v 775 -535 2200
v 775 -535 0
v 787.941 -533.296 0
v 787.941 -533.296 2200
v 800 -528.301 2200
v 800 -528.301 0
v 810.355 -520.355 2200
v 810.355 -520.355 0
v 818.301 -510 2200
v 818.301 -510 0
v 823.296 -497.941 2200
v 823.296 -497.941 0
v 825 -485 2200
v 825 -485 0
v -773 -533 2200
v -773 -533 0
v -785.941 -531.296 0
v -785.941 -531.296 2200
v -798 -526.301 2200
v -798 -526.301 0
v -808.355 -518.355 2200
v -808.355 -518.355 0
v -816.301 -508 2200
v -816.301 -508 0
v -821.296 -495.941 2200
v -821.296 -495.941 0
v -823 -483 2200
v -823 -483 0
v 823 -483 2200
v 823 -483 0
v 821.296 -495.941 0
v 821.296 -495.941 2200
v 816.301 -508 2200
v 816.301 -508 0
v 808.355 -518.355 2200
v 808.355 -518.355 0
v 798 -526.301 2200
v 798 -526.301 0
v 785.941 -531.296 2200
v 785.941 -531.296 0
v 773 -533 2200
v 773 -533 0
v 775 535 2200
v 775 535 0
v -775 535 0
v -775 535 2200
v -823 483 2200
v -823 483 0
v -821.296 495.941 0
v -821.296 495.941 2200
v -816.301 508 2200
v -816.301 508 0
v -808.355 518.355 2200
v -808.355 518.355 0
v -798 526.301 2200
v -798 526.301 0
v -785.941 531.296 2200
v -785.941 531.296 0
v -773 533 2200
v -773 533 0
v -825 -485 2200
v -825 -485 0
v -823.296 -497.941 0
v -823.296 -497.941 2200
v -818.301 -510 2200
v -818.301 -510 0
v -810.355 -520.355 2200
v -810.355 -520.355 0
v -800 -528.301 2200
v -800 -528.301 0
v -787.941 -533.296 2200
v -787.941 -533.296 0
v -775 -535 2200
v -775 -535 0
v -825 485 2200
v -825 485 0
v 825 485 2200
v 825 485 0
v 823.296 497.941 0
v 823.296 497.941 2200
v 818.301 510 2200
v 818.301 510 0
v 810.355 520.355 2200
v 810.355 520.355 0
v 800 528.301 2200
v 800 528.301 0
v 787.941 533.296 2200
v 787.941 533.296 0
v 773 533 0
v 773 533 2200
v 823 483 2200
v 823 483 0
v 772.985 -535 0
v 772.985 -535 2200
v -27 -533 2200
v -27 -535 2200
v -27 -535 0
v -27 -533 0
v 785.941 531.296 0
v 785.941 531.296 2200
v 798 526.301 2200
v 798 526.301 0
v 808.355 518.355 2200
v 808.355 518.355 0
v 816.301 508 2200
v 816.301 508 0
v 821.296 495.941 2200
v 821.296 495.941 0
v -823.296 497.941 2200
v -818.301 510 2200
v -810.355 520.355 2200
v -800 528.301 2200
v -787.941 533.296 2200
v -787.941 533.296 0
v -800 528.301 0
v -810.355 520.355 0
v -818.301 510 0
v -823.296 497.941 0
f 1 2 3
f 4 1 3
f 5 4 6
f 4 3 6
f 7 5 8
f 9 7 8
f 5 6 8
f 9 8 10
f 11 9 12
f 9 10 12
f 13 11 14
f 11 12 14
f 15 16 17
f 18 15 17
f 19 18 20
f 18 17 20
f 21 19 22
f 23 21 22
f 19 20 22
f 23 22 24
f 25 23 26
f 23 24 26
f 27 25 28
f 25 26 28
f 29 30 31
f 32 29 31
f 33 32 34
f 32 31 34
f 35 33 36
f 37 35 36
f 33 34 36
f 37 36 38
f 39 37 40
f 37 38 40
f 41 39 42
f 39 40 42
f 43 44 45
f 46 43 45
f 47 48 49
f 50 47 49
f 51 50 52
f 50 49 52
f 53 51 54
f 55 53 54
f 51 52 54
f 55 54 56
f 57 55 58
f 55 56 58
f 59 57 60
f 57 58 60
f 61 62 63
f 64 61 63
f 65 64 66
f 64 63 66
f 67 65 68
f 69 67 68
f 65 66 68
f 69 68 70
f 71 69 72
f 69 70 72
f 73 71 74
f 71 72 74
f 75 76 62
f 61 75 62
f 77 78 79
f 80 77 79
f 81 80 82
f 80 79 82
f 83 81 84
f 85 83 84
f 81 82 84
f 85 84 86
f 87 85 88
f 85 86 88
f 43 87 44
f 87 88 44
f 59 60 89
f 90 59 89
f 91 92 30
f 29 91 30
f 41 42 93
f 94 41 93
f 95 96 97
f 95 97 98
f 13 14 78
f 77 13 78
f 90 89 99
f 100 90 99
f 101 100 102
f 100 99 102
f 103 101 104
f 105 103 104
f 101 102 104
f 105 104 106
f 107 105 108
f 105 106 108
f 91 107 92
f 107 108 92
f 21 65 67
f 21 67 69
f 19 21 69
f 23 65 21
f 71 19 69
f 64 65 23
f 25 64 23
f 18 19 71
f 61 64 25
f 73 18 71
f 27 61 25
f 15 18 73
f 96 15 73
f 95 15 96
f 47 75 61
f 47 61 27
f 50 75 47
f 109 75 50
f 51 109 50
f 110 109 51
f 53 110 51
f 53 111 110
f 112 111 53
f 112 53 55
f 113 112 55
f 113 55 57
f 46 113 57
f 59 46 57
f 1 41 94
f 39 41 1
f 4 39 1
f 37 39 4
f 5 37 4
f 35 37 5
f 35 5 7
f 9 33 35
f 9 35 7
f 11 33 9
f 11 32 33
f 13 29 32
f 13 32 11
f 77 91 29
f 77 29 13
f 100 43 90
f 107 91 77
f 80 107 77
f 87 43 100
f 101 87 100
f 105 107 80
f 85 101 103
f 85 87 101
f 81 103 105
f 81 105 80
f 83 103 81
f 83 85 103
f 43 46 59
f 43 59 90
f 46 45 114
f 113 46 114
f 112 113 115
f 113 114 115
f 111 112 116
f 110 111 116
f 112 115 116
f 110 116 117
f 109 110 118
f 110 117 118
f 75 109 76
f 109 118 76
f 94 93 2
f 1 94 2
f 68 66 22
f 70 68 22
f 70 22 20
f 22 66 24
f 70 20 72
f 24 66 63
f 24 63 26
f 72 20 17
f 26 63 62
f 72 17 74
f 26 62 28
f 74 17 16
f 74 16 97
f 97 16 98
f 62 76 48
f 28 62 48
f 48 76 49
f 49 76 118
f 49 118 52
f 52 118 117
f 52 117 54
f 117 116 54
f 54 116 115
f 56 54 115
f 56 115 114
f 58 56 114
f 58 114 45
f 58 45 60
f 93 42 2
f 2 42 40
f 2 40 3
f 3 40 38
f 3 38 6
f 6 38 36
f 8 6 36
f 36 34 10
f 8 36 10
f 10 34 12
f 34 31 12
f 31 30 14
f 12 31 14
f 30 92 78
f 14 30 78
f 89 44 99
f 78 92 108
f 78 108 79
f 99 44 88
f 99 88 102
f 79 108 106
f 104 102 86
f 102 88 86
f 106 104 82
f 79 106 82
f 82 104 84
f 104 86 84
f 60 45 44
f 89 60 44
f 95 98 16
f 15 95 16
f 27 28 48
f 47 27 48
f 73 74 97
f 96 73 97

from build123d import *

# Parameters (mm, degrees)
F1_DEPTH = 2200


with BuildPart() as f1:
    # F0 (on Top) → F1 (new body)
    with BuildSketch(Plane.XY):
        with BuildLine():
            ThreePointArc((825, 485), (810.355339, 520.355339), (775, 535))
            Line((775, 535), (-775, 535))
            ThreePointArc((-775, 535), (-810.355339, 520.355339), (-825, 485))
            Line((-825, 485), (-825, -485))
            ThreePointArc((-825, -485), (-810.355339, -520.355339), (-775, -535))
            Line((-775, -535), (-27, -535))
            Line((-27, -535), (-27, -533))
            Line((-27, -533), (-773, -533))
            ThreePointArc((-773, -533), (-808.355339, -518.355339), (-823, -483))
            Line((-823, -483), (-823, 483))
            ThreePointArc((-823, 483), (-808.355339, 518.355339), (-773, 533))
            Line((-773, 533), (773, 533))
            ThreePointArc((773, 533), (808.355339, 518.355339), (823, 483))
            Line((823, 483), (823, -483))
            ThreePointArc((823, -483), (808.355339, -518.355339), (773, -533))
            Line((773, -533), (772.985399, -535))
            Line((772.985399, -535), (775, -535))
            ThreePointArc((775, -535), (810.355339, -520.355339), (825, -485))
            Line((825, -485), (825, 485))
        make_face()
    extrude(amount=F1_DEPTH)


solid = f1.part
